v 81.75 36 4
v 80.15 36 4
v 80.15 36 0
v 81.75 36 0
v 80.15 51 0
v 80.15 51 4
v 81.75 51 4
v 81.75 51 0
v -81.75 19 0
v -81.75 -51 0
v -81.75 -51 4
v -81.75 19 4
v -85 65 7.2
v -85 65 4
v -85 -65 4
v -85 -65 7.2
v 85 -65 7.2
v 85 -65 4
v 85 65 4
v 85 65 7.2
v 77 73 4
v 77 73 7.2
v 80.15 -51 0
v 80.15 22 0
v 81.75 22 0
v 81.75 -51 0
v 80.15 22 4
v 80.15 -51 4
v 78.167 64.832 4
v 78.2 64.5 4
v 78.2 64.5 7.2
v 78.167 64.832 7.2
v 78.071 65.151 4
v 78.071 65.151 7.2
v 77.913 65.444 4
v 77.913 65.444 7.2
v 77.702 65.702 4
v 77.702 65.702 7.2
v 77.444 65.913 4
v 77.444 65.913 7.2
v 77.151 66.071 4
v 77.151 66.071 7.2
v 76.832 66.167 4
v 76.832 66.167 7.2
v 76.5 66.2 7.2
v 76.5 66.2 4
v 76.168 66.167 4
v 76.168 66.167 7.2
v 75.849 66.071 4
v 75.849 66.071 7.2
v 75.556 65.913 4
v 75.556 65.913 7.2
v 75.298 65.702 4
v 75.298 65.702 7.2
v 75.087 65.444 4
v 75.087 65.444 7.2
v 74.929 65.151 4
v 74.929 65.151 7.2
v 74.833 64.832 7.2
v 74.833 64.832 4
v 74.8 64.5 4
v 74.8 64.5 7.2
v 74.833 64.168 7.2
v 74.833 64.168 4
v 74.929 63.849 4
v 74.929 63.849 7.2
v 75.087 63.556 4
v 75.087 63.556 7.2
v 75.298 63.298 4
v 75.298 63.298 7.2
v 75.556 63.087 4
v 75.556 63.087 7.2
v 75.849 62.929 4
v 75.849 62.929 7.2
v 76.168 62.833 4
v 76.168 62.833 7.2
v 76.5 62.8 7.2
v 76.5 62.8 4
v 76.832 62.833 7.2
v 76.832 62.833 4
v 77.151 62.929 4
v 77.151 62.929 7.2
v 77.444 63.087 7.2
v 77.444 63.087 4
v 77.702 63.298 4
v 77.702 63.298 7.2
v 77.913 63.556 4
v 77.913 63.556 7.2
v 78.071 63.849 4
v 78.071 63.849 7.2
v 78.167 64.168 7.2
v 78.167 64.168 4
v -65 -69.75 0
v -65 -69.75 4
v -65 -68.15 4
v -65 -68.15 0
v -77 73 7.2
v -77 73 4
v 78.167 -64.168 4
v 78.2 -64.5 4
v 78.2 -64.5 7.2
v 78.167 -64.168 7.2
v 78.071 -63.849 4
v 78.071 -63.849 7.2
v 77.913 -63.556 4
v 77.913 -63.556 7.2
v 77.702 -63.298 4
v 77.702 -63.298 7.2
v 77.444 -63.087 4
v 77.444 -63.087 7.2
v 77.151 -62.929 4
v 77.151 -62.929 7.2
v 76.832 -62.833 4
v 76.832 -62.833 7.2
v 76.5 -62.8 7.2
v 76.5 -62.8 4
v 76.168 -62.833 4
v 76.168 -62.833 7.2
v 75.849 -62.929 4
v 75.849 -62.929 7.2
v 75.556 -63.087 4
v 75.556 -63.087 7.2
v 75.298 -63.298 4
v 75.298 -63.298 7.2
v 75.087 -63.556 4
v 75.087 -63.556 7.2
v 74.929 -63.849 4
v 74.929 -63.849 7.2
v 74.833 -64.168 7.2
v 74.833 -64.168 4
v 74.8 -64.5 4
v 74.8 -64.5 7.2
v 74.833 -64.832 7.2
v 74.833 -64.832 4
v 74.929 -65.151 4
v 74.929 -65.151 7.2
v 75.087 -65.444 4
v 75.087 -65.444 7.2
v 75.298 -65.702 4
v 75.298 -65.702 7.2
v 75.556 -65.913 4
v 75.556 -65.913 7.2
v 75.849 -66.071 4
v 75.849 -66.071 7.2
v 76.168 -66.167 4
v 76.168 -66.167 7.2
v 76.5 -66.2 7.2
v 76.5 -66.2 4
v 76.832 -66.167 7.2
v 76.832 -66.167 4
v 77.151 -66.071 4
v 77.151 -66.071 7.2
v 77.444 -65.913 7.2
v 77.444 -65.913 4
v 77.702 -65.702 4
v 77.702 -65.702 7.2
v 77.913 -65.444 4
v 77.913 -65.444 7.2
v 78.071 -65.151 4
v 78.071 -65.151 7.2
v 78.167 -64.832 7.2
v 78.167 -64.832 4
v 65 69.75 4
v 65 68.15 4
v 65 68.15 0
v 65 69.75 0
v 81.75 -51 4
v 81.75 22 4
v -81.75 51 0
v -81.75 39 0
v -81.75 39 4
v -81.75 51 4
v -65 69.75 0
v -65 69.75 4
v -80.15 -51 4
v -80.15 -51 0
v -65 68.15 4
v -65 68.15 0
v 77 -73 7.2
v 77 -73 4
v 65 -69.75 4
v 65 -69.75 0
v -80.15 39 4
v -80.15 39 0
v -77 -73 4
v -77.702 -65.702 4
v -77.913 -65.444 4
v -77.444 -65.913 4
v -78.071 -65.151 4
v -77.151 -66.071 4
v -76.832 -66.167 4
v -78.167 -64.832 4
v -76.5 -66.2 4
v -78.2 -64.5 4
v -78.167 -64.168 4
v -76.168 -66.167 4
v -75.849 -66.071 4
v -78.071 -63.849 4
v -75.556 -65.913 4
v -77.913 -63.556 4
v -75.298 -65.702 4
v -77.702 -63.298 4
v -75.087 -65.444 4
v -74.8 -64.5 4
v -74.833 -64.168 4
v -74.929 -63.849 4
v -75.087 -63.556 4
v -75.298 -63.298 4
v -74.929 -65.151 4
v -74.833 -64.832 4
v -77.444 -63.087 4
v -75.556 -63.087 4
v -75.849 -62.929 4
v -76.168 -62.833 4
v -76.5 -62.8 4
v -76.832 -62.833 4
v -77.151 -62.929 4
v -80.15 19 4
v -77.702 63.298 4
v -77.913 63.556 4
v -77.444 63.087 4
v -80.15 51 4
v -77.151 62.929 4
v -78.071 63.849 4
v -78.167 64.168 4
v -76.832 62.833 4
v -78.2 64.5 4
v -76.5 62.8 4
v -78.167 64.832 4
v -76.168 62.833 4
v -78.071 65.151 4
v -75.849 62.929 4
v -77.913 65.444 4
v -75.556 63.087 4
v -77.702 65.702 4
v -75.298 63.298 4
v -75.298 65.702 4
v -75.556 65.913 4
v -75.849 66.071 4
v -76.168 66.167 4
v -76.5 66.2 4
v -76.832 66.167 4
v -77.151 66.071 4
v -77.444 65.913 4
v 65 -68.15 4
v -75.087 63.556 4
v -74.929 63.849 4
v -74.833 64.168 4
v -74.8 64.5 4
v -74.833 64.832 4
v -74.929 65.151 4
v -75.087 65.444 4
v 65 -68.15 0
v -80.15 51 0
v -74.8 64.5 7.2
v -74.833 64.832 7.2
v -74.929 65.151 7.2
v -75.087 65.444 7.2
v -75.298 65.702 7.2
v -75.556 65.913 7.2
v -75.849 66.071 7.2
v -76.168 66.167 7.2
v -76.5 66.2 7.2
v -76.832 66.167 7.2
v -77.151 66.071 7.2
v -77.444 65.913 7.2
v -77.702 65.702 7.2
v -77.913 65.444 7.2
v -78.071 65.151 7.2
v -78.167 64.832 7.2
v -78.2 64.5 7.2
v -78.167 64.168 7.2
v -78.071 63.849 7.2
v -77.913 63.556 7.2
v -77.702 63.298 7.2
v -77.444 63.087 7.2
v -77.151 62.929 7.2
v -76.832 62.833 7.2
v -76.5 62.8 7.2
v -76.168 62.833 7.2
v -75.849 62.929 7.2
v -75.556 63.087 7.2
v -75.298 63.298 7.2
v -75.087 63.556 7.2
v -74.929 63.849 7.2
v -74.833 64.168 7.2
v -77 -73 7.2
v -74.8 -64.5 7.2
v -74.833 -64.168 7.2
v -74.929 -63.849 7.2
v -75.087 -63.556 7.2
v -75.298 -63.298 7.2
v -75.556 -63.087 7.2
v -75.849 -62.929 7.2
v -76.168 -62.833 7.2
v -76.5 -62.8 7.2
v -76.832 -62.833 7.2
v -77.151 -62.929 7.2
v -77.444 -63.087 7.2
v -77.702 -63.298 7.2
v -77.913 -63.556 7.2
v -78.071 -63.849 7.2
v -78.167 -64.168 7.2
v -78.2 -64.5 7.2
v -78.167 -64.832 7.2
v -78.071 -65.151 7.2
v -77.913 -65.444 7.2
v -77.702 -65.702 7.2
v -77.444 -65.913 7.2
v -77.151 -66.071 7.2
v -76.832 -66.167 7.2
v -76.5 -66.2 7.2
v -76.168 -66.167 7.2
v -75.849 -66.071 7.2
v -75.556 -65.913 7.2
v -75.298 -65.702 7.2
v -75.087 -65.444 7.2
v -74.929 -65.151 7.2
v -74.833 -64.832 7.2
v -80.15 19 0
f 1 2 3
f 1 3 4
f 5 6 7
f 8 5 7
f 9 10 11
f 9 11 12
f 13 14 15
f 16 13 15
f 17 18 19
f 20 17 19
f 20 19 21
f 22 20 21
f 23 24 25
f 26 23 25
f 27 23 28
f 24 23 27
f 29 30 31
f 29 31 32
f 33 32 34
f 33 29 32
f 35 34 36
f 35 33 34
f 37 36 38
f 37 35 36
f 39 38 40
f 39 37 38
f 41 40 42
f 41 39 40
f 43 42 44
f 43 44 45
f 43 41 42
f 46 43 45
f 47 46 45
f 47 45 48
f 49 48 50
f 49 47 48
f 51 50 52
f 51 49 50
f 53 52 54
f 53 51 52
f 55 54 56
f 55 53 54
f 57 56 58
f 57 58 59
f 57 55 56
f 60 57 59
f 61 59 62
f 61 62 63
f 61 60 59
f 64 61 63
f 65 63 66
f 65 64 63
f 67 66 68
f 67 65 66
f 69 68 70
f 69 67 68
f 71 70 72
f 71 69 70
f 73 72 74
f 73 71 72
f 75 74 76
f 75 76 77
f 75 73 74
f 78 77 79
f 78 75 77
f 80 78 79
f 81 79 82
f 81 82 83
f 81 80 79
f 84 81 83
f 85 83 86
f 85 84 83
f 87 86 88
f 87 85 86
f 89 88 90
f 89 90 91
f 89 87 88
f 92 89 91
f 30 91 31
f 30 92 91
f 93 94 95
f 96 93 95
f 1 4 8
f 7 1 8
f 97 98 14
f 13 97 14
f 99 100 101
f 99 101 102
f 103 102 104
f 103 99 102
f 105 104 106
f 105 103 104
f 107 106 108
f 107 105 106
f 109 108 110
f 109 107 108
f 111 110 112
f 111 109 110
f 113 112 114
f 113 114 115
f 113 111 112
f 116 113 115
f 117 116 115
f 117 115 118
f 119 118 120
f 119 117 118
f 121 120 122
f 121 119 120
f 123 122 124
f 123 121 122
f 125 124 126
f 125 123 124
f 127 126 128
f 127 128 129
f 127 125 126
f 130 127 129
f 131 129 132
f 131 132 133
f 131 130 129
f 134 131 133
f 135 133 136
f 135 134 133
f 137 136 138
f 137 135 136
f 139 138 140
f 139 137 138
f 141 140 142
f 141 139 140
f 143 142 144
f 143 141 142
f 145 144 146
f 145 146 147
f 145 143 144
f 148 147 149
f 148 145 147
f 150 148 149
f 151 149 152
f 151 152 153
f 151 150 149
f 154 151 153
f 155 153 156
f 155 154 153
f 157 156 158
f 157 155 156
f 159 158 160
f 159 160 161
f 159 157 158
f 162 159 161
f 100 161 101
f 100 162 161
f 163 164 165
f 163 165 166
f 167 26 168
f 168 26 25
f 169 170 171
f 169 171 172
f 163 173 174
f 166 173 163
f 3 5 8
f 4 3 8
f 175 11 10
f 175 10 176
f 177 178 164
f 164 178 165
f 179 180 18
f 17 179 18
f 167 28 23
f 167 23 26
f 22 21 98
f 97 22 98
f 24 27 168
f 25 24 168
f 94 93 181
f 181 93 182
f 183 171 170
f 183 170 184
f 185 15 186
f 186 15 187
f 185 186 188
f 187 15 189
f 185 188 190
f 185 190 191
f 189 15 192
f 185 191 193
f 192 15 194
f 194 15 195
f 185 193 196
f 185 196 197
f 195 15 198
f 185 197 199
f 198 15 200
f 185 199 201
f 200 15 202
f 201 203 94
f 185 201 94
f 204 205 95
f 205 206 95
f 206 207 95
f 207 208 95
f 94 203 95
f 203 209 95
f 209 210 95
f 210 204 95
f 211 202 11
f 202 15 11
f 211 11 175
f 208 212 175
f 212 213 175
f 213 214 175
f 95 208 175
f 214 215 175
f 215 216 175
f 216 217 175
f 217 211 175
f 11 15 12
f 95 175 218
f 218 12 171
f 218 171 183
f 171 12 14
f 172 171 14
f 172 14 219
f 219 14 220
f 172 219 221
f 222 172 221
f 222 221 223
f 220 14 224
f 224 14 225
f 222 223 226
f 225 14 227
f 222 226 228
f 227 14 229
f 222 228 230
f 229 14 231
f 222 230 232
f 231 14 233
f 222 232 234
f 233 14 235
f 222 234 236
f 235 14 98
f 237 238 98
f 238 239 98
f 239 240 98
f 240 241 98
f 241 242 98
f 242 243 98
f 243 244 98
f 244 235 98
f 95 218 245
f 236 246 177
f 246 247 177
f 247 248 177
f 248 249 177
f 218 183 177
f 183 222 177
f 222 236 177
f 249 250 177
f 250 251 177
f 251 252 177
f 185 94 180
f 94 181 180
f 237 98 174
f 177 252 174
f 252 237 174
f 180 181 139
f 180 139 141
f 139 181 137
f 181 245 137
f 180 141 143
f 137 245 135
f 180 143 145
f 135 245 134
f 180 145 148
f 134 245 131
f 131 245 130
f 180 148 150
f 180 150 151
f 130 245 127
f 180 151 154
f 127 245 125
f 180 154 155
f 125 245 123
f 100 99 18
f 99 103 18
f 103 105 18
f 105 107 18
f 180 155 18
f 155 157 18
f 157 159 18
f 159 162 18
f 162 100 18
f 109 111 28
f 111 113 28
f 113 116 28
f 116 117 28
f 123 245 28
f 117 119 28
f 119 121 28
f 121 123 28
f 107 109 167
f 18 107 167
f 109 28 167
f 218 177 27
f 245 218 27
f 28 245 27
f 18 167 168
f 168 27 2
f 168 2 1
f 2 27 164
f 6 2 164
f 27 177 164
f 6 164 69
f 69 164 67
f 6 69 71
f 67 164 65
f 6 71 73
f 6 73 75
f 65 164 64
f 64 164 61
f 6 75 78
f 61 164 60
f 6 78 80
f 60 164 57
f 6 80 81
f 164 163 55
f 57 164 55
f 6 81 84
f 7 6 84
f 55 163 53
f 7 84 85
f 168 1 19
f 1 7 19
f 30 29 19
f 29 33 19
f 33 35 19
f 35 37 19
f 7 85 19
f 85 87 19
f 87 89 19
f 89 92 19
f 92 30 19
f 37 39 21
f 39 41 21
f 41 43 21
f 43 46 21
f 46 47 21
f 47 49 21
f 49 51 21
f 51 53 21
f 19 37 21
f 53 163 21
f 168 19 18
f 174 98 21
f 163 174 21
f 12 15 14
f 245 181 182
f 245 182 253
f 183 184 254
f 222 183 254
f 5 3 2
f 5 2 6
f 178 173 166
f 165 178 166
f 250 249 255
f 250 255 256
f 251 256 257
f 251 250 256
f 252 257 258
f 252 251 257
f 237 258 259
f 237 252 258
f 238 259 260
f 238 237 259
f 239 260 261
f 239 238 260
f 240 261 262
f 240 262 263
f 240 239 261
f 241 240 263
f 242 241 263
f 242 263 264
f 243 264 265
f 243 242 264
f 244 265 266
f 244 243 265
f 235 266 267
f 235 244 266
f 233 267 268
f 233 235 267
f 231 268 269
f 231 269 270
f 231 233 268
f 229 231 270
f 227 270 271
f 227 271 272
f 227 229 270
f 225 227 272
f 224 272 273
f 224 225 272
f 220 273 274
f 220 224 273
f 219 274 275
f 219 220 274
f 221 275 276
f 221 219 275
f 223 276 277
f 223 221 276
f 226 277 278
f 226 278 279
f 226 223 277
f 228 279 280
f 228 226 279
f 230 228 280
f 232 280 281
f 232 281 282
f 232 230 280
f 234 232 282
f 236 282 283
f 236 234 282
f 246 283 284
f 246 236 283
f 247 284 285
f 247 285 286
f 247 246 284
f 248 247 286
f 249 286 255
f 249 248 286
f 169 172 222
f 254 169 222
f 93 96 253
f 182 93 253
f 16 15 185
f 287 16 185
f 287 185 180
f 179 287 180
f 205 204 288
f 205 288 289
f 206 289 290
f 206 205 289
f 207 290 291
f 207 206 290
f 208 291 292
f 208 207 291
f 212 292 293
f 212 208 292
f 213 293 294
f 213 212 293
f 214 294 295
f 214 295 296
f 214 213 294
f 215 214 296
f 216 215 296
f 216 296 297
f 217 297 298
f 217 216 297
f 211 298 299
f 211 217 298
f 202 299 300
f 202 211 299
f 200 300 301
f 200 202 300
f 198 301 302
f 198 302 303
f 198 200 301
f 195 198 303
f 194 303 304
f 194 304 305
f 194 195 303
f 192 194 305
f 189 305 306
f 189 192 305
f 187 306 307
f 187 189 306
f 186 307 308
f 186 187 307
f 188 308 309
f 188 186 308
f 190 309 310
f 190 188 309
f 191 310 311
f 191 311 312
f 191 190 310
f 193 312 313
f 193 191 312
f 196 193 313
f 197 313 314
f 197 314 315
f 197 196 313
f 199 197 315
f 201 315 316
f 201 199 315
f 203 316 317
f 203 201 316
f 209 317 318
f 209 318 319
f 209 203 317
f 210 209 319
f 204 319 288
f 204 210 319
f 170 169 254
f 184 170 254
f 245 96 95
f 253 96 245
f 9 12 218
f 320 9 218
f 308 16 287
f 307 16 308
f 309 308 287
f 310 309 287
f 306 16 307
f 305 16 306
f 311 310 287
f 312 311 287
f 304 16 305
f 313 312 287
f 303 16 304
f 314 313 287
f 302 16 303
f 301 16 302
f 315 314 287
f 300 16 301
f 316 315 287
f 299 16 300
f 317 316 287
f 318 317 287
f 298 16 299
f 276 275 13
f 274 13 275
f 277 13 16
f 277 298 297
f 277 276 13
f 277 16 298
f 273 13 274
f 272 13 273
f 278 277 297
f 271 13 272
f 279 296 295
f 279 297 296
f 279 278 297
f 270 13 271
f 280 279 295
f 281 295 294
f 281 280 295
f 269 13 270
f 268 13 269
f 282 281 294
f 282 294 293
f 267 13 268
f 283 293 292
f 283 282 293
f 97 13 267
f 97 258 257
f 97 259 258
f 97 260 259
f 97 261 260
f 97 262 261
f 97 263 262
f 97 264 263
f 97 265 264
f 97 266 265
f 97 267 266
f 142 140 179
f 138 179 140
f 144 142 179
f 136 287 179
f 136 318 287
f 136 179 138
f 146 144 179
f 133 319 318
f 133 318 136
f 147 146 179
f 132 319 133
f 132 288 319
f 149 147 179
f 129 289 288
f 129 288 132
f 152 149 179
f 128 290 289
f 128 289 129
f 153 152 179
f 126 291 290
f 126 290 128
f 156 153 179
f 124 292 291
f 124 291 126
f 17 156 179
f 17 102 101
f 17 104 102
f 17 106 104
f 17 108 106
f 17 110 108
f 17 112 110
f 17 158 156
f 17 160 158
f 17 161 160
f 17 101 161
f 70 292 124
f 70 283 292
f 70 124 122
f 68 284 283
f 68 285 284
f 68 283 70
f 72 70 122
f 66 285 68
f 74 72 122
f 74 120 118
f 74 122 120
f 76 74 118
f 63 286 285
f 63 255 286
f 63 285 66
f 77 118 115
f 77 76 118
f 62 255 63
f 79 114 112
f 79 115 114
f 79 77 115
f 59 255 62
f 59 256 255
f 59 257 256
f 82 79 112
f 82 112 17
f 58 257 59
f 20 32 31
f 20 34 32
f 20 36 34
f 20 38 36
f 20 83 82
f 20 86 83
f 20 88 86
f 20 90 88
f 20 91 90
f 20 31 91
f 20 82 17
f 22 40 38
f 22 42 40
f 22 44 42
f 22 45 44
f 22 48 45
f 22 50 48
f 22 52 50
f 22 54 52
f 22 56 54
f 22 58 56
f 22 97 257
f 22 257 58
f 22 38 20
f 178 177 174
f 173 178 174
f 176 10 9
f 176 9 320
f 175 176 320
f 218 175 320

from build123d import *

# Parameters (mm, degrees)
COVER_START                                = 4
COVER_3_2_FOUR_SCREW_CLEARANCES_D3_4_P_R   = 1.7
COVER_3_2_FOUR_SCREW_CLEARANCES_D3_4_DEPTH = 3.2
LOCATING_LIPS_0_45_WALL_CLEARANCE_PROF_W   = 130
LOCATING_LIPS_0_45_WALL_CLEARANCE_PROF_H   = 1.6
LOCATING_LIPS_0_45_WALL_CLEARANCE_PROF_W_2 = 1.6
LOCATING_LIPS_0_45_WALL_CLEARANCE_PROF_H_2 = 70
LOCATING_LIPS_0_45_WALL_CLEARANCE_PROF_H_3 = 12
LOCATING_LIPS_0_45_WALL_CLEARANCE_PROF_H_4 = 73
LOCATING_LIPS_0_45_WALL_CLEARANCE_PROF_H_5 = 15
LOCATING_LIPS_0_45_WALL_CLEARANCE_DEPTH    = 4


with BuildPart() as part:
    # Cover 3.2 - four screw clearances D3.4 profile → Cover 3.2 - four screw clearances D3.4 (new body)
    with BuildSketch(Plane.XY.offset(COVER_START)):
        Polygon((-77, -73), (77, -73), (85, -65), (85, 65), (77, 73), (-77, 73), (-85, 65), (-85, -65), align=None)
        with Locations((-76.5, -64.5)):
            Circle(COVER_3_2_FOUR_SCREW_CLEARANCES_D3_4_P_R, mode=Mode.SUBTRACT)
        with Locations((-76.5, 64.5)):
            Circle(COVER_3_2_FOUR_SCREW_CLEARANCES_D3_4_P_R, mode=Mode.SUBTRACT)
        with Locations((76.5, -64.5)):
            Circle(COVER_3_2_FOUR_SCREW_CLEARANCES_D3_4_P_R, mode=Mode.SUBTRACT)
        with Locations((76.5, 64.5)):
            Circle(COVER_3_2_FOUR_SCREW_CLEARANCES_D3_4_P_R, mode=Mode.SUBTRACT)
    extrude(amount=COVER_3_2_FOUR_SCREW_CLEARANCES_D3_4_DEPTH)

    # Locating lips - 0.45 wall clearance profile → Locating lips - 0.45 wall clearance (add)
    with BuildSketch(Plane.XY):
        with Locations((0, -68.95)):
            Rectangle(LOCATING_LIPS_0_45_WALL_CLEARANCE_PROF_W, LOCATING_LIPS_0_45_WALL_CLEARANCE_PROF_H)
        with Locations((0, 68.95)):
            Rectangle(LOCATING_LIPS_0_45_WALL_CLEARANCE_PROF_W, LOCATING_LIPS_0_45_WALL_CLEARANCE_PROF_H)
        with Locations((-80.95, -16)):
            Rectangle(LOCATING_LIPS_0_45_WALL_CLEARANCE_PROF_W_2, LOCATING_LIPS_0_45_WALL_CLEARANCE_PROF_H_2)
        with Locations((-80.95, 45)):
            Rectangle(LOCATING_LIPS_0_45_WALL_CLEARANCE_PROF_W_2, LOCATING_LIPS_0_45_WALL_CLEARANCE_PROF_H_3)
        with Locations((80.95, -14.5)):
            Rectangle(LOCATING_LIPS_0_45_WALL_CLEARANCE_PROF_W_2, LOCATING_LIPS_0_45_WALL_CLEARANCE_PROF_H_4)
        with Locations((80.95, 43.5)):
            Rectangle(LOCATING_LIPS_0_45_WALL_CLEARANCE_PROF_W_2, LOCATING_LIPS_0_45_WALL_CLEARANCE_PROF_H_5)
    extrude(amount=LOCATING_LIPS_0_45_WALL_CLEARANCE_DEPTH)


solid = part.part
